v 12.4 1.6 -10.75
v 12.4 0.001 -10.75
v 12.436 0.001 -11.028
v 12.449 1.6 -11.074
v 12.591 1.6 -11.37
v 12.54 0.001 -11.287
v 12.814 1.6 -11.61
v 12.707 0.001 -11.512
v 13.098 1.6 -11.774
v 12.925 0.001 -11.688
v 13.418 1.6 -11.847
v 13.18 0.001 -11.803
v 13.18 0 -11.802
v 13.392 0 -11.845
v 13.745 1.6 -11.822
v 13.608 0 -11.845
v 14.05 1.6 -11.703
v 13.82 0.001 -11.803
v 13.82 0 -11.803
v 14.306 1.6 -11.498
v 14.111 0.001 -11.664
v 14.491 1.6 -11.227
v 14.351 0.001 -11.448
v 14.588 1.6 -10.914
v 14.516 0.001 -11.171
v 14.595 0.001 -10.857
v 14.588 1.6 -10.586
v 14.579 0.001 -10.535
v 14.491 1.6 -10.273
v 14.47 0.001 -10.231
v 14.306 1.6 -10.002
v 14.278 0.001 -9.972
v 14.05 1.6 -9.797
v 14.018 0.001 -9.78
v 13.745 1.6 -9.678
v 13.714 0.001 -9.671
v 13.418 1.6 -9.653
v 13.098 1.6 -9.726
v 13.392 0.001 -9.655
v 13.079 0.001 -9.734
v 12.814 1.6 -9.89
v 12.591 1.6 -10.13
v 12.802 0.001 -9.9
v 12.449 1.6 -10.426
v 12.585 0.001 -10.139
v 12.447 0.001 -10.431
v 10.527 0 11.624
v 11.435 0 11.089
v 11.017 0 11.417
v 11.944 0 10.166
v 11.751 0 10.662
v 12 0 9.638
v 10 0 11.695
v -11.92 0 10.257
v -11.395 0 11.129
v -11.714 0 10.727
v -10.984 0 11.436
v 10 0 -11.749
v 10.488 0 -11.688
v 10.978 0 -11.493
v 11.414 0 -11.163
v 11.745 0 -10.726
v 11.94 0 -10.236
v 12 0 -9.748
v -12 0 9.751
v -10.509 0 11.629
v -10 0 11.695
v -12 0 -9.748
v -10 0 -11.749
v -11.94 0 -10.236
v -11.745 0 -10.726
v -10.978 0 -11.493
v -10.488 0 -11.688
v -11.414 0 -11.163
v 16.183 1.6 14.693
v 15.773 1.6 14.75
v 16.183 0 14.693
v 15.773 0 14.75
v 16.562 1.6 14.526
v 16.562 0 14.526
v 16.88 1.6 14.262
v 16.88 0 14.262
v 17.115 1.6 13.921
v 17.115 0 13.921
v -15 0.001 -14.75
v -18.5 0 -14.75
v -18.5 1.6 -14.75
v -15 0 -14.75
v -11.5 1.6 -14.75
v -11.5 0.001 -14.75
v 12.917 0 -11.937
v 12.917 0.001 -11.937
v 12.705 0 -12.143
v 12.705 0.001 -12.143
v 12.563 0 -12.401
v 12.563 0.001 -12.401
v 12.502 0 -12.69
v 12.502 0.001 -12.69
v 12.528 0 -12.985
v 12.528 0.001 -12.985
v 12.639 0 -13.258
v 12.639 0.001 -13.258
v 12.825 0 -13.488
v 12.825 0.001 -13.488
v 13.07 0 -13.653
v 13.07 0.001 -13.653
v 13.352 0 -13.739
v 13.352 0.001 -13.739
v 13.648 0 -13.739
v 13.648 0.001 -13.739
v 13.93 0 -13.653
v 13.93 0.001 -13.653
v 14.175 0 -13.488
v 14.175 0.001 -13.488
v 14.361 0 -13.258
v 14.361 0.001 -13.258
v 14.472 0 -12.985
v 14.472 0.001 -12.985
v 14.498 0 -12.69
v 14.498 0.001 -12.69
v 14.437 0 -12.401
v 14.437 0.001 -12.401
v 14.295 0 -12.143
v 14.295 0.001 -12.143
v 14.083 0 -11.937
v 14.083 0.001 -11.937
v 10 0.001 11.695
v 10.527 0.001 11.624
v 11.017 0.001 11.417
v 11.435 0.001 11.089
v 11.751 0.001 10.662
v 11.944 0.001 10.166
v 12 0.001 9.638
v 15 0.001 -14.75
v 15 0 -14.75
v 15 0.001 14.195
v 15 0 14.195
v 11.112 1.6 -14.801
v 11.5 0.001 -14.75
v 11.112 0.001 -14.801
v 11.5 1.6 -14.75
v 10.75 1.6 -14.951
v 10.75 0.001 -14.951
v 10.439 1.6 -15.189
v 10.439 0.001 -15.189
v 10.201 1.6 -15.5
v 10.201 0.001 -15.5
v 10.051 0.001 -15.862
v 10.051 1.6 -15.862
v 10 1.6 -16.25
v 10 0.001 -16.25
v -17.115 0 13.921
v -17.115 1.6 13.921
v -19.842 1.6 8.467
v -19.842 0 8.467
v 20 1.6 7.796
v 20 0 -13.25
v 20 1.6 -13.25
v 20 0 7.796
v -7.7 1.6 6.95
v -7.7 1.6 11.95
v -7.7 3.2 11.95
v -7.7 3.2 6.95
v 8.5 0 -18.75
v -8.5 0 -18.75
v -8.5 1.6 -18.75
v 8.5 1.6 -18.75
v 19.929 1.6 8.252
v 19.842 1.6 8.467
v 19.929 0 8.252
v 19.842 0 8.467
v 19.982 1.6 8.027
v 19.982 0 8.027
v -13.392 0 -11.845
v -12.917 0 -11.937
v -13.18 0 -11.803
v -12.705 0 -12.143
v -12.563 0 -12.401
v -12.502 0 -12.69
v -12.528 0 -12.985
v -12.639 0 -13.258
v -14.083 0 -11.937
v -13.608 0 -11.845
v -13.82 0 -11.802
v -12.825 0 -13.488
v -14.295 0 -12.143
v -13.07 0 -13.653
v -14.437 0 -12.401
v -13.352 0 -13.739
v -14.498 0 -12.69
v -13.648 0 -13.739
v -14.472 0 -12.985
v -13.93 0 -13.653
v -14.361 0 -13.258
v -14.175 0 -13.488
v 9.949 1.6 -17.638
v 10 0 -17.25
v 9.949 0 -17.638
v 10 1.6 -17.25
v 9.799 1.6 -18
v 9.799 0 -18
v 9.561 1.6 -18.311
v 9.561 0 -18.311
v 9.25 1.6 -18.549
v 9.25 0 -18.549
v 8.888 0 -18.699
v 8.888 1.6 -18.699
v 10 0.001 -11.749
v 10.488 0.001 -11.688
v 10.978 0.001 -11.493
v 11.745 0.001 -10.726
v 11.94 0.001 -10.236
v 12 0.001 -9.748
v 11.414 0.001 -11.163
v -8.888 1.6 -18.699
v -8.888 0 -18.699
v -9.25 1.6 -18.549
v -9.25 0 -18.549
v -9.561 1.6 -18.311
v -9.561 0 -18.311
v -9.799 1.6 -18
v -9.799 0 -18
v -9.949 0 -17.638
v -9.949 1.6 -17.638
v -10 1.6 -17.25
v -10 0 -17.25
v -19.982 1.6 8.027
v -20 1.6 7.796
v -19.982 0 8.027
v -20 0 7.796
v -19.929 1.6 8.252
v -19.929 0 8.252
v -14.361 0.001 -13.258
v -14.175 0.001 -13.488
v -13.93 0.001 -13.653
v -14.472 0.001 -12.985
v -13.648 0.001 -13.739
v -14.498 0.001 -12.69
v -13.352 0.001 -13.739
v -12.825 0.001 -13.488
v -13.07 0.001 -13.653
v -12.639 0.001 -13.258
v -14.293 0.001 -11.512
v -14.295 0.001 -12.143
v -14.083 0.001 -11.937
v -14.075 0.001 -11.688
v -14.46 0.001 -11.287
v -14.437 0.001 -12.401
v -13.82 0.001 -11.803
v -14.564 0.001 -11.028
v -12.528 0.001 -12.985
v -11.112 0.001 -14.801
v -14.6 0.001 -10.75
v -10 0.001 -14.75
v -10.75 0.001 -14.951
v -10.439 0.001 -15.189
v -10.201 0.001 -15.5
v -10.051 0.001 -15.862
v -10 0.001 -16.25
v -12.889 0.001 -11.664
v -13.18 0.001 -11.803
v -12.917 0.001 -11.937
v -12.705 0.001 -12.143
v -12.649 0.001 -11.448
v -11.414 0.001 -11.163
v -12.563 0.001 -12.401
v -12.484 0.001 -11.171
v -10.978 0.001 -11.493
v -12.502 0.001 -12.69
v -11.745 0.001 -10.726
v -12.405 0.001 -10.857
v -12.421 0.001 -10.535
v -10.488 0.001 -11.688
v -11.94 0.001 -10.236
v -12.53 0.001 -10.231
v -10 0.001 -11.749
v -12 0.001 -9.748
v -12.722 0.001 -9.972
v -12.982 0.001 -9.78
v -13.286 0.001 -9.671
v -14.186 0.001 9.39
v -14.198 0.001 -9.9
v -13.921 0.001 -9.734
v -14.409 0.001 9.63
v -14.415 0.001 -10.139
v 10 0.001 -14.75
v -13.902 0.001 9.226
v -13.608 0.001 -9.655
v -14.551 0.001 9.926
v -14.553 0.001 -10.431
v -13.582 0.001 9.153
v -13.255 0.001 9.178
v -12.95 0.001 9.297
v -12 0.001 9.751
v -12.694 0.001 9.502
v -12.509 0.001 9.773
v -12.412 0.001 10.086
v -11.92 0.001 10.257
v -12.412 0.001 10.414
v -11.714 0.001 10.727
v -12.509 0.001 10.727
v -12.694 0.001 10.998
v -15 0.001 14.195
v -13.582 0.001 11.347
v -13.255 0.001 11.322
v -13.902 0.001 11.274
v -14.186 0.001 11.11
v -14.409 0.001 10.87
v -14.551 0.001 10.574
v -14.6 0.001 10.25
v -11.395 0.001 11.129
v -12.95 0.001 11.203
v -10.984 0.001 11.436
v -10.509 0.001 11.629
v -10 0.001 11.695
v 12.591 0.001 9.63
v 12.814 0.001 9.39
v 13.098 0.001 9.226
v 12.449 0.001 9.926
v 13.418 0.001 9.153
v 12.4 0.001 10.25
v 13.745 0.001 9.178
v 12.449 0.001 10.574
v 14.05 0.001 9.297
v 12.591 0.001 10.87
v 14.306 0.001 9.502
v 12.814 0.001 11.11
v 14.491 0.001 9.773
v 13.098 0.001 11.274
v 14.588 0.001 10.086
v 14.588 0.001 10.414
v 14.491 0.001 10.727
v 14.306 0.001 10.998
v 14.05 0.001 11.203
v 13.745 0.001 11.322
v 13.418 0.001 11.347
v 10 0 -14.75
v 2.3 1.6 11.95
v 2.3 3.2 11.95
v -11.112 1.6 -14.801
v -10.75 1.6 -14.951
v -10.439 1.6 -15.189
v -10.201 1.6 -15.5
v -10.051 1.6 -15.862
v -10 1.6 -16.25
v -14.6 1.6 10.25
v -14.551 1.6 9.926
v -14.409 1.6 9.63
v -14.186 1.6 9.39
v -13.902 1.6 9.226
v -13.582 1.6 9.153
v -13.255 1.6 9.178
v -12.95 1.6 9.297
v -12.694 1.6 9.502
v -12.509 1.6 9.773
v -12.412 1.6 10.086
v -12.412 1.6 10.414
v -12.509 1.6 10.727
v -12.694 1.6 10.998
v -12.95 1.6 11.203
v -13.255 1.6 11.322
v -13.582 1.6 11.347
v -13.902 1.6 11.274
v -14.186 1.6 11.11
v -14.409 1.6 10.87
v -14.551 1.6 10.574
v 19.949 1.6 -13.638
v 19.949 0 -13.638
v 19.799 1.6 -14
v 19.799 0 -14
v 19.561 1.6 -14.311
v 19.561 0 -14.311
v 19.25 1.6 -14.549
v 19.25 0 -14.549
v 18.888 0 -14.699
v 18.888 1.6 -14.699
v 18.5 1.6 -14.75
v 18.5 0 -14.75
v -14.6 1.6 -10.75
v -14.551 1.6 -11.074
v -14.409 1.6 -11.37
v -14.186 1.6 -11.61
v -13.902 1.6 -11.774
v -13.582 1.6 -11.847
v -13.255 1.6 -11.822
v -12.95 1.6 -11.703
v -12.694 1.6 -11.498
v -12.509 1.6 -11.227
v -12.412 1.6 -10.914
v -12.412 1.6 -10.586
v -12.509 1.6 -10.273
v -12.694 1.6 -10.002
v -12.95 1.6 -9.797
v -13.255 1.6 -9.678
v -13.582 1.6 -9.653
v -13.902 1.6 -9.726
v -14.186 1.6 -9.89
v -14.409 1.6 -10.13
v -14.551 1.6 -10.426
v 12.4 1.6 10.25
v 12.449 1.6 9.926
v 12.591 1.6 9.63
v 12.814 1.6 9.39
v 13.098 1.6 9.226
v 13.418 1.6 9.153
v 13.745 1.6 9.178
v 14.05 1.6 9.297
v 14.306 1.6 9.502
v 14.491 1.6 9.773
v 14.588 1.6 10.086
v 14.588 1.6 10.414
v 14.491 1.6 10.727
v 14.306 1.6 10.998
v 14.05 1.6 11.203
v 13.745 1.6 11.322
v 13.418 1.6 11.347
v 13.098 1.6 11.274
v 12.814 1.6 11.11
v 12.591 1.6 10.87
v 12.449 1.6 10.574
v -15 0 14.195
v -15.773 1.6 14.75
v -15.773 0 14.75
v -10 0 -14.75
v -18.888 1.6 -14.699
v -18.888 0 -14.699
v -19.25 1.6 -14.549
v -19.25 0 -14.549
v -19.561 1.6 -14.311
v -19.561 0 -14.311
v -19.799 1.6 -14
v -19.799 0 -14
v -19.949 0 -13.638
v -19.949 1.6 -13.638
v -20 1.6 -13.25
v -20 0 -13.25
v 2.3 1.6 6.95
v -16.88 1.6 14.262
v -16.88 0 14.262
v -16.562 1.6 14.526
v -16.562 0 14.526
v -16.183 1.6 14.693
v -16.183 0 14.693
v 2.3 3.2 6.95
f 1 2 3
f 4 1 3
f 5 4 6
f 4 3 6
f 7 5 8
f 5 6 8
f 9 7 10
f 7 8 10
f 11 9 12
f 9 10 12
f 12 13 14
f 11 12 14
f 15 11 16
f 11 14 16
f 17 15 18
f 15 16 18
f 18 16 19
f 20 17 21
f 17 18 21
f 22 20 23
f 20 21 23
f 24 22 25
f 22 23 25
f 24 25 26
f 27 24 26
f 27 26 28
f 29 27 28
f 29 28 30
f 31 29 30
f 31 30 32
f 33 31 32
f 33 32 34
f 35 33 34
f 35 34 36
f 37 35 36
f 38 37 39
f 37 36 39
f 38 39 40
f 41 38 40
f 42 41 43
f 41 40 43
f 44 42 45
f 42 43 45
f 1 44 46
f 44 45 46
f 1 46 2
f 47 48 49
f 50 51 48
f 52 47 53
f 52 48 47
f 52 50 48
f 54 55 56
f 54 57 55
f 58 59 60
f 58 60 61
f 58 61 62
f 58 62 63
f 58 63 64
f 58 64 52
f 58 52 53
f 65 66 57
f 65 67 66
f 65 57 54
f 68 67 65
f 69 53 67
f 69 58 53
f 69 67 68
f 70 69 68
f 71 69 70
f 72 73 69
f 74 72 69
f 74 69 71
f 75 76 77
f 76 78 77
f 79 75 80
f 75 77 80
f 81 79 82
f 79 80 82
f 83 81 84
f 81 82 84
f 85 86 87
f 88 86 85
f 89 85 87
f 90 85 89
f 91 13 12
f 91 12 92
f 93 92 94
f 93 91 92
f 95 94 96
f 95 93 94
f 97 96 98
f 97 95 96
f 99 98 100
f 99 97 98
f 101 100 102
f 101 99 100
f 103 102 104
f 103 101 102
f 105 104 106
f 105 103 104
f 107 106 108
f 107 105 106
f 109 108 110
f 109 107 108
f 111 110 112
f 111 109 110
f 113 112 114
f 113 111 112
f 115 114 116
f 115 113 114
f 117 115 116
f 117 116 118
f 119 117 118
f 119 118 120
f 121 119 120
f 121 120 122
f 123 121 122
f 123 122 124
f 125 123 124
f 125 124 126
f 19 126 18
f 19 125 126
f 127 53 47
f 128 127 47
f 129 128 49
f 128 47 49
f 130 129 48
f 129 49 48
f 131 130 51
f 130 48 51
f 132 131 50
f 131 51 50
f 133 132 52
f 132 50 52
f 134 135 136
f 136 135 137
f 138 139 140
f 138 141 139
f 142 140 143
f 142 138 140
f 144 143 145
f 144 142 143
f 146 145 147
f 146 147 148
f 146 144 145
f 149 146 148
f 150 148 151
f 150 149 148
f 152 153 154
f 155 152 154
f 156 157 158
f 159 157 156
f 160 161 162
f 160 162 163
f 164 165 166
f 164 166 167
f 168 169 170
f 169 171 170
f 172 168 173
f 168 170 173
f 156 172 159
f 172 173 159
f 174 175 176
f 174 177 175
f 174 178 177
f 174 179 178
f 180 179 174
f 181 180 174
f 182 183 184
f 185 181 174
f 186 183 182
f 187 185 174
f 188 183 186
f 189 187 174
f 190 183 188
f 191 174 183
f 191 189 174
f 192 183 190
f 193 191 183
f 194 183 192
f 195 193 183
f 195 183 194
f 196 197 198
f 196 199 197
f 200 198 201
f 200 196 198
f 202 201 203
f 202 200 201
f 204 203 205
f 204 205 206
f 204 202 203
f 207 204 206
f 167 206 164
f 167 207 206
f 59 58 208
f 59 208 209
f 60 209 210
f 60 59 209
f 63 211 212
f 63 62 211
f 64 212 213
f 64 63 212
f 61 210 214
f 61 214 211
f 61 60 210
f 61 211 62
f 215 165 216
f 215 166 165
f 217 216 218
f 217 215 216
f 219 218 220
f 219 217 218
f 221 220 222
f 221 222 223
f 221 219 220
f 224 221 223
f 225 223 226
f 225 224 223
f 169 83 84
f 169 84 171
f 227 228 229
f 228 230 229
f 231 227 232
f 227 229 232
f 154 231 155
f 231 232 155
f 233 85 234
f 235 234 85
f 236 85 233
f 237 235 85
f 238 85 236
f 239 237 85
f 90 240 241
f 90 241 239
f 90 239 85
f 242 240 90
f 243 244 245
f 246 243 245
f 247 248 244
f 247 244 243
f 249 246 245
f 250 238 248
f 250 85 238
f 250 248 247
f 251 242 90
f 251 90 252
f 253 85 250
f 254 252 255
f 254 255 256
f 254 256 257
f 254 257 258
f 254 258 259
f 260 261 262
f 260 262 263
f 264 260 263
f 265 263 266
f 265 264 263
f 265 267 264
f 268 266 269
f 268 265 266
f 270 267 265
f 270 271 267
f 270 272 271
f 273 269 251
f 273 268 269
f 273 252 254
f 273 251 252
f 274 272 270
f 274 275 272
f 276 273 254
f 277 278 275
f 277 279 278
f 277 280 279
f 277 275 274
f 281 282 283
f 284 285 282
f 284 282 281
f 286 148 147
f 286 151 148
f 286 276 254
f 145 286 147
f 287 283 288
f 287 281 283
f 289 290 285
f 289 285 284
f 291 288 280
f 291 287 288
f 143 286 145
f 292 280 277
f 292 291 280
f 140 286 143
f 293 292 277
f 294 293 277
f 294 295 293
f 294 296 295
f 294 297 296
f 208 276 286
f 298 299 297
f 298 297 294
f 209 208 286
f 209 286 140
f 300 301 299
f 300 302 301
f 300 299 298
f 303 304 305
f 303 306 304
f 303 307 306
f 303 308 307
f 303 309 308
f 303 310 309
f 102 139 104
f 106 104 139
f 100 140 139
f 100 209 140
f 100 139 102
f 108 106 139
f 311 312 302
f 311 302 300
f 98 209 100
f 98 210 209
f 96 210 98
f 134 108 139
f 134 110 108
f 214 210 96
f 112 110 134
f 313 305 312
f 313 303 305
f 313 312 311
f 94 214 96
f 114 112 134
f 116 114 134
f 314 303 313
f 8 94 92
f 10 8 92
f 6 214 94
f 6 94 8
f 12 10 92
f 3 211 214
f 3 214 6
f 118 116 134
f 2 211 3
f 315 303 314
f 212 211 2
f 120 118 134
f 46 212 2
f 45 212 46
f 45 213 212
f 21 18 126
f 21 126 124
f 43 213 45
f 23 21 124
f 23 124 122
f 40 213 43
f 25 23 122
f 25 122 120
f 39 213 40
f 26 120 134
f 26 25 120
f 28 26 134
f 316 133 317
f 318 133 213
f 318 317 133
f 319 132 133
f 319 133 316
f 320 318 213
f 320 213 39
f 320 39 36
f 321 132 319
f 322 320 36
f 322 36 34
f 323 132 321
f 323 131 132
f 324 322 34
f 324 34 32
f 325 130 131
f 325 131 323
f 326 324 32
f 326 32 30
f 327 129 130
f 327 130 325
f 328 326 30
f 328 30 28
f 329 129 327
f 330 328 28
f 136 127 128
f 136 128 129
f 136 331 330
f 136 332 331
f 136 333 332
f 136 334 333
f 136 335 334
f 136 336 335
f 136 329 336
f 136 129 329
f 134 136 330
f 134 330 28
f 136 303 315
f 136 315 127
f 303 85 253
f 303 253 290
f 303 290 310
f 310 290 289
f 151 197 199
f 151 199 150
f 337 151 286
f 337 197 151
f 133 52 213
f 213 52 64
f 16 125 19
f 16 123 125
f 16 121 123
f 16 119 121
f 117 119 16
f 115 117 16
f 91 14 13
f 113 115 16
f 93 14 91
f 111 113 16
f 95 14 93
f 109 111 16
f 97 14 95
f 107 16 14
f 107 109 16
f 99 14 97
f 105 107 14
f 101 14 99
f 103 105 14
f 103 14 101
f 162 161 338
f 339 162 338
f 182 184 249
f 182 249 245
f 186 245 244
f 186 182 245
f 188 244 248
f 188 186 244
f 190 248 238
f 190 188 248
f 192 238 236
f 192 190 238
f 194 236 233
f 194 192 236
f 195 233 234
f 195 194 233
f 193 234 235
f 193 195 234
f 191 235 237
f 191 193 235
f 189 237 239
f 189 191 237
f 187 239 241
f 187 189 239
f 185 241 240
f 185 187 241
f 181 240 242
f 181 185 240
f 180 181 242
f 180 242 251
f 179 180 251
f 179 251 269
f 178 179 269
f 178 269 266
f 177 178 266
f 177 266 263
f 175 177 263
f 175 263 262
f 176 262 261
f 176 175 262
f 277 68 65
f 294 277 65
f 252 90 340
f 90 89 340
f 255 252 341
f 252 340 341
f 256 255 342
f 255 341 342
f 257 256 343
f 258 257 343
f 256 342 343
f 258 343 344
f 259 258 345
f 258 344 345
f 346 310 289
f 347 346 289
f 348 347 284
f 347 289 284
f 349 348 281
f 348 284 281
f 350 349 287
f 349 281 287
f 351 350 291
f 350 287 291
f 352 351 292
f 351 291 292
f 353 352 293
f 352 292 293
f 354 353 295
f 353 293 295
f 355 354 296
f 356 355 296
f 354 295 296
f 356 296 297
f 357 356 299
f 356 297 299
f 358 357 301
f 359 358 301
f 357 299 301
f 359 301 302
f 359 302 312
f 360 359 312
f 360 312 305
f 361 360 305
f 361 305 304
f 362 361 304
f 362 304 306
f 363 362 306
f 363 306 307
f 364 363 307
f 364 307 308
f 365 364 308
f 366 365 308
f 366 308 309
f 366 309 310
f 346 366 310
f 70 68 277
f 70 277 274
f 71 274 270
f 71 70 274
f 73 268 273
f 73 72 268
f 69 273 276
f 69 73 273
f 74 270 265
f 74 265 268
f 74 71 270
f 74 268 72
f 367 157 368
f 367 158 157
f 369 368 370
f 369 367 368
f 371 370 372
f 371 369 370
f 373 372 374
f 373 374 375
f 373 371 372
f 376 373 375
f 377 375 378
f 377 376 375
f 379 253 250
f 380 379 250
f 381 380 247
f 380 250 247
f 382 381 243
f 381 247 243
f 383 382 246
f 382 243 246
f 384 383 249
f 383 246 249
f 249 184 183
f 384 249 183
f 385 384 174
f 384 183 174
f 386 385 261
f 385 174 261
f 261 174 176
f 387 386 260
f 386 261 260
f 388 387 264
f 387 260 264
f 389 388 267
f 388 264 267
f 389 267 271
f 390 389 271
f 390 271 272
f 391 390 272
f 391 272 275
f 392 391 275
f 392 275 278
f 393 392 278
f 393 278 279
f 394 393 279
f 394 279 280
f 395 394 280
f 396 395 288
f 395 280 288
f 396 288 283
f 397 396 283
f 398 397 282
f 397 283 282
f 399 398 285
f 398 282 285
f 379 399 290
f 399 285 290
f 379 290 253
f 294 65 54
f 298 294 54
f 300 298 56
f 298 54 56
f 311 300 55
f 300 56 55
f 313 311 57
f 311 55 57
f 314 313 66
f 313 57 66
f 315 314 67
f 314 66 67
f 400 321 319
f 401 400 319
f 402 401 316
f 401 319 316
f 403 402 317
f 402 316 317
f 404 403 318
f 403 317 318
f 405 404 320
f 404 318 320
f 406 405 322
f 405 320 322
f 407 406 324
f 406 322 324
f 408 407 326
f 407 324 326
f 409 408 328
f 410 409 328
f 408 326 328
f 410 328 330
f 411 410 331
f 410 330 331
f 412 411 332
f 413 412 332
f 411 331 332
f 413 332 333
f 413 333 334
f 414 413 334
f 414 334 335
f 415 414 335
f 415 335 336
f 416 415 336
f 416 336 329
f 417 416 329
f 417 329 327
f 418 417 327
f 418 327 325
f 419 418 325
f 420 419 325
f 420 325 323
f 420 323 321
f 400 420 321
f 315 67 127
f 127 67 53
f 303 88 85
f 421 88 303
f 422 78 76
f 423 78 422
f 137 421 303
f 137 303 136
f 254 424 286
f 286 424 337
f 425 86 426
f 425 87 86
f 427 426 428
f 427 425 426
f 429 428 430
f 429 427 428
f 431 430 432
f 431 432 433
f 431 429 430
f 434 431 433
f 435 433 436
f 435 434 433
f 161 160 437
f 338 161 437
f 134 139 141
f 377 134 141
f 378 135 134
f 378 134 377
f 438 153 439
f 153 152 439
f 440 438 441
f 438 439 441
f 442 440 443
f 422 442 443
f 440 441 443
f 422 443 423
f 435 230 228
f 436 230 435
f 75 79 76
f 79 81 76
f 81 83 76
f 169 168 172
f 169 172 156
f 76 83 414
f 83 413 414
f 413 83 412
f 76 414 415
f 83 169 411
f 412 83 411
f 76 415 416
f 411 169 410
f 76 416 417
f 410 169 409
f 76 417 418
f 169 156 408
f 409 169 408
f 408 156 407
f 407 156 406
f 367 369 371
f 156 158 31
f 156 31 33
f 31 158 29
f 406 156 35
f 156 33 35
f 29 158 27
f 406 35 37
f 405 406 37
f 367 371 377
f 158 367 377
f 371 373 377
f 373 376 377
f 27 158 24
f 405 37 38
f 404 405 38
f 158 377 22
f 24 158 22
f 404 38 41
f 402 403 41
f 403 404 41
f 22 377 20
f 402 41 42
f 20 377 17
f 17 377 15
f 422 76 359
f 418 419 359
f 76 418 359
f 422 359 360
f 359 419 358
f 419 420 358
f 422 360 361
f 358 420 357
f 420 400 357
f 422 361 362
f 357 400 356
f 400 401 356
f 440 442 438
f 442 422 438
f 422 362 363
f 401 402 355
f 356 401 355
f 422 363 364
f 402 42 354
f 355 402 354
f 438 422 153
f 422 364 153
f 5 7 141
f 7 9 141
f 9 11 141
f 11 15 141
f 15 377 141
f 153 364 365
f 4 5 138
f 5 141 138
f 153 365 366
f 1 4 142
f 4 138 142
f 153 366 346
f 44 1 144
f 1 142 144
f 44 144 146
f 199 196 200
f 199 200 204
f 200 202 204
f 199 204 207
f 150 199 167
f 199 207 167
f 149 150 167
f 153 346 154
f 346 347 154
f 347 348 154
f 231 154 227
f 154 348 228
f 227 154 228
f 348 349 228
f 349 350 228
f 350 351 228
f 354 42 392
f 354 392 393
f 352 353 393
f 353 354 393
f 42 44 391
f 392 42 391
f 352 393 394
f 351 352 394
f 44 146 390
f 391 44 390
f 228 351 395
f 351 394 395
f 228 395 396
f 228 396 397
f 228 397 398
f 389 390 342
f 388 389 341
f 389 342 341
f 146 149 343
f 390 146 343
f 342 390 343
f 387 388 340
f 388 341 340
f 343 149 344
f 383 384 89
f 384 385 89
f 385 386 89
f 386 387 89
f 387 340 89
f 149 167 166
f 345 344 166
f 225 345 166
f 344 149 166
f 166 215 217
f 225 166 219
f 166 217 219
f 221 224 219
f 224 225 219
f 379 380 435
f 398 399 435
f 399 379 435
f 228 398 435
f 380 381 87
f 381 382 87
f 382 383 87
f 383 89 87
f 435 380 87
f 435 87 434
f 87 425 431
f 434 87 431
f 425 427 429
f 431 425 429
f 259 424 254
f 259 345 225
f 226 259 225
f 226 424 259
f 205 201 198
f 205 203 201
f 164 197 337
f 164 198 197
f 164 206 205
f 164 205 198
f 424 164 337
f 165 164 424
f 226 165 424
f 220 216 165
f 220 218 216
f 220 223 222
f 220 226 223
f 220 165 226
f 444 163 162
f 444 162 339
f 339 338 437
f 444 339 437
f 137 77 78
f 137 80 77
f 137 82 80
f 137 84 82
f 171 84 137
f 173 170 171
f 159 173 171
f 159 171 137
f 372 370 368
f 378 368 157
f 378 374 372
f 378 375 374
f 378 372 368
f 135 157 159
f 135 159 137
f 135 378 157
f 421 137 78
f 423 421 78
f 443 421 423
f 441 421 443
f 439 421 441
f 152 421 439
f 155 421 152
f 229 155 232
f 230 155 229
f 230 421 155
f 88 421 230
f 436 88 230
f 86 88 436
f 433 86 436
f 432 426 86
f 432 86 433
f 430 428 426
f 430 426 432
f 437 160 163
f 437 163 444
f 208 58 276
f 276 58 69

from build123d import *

# Parameters (mm, degrees)
BOSS_EXTRUDE1_DEPTH      = 1.6
CUT_EXTRUDE4_DEPTH       = 28.461290938
M2_CLEARANCE_HOLE1_D     = 2.2
M2_CLEARANCE_HOLE1_DEPTH = 5.2
M2_CLEARANCE_HOLE1_TIP   = 0.660946681
SKETCH11_W               = 30
SKETCH11_H               = 28.944863729
SKETCH11_R               = 1
CUT_EXTRUDE3_DEPTH       = 0.001
SKETCH13_W               = 10
SKETCH13_H               = 5
BOSS_EXTRUDE2_DEPTH      = 1.6
FILLET1_R                = 1.5


with BuildPart() as part:
    # Sketch1 → Boss-Extrude1 (new body)
    with BuildSketch(Plane(origin=(0, 0, 0), x_dir=(1, 0, 0), z_dir=(0, 1, 0))):
        Polygon((-20, 14.75), (-10, 14.75), (-10, 18.75), (10, 18.75), (10, 14.75), (20, 14.75), (20, -14.75), (-20, -14.75), align=None)
    extrude(amount=BOSS_EXTRUDE1_DEPTH)

    # Sketch12 → Cut-Extrude4 (cut, through all)
    with BuildSketch(Plane(origin=(0, 1.6, 0), x_dir=(1, 0, 0), z_dir=(0, 1, 0))):
        Polygon((-16.7, -14.75), (-20, -8.15), (-20, -14.75), align=None)
        Polygon((16.7, -14.75), (20, -8.15), (20, -14.75), align=None)
    extrude(amount=-CUT_EXTRUDE4_DEPTH, mode=Mode.SUBTRACT)

    # M2 Clearance Hole1
    with Locations(Plane(origin=(0, 1.6, 0), x_dir=(1, 0, 0), z_dir=(0, 1, 0))):
        with Locations((-13.5, 10.75), (13.5, 10.75), (13.5, -10.25), (-13.5, -10.25)):
            Hole(M2_CLEARANCE_HOLE1_D / 2, depth=M2_CLEARANCE_HOLE1_DEPTH)
            with Locations((0, 0, -(M2_CLEARANCE_HOLE1_DEPTH + M2_CLEARANCE_HOLE1_TIP / 2))):  # 118° drill point
                Cone(0, M2_CLEARANCE_HOLE1_D / 2, M2_CLEARANCE_HOLE1_TIP, mode=Mode.SUBTRACT)

    # Sketch11 → Cut-Extrude3 (cut)
    with BuildSketch(Plane.XZ):
        with Locations((0, -0.277568136)):
            Rectangle(SKETCH11_W, SKETCH11_H)
        with Locations((13.5, -12.75)):
            Circle(SKETCH11_R, mode=Mode.SUBTRACT)
        with Locations((13.5, 10.25)):
            Circle(SKETCH11_R, mode=Mode.SUBTRACT)
        with Locations((-13.5, -12.75)):
            Circle(SKETCH11_R, mode=Mode.SUBTRACT)
        with Locations((-13.5, 10.25)):
            Circle(SKETCH11_R, mode=Mode.SUBTRACT)
        with BuildLine():
            Line((-10, 11.694863729), (10, 11.694863729))
            ThreePointArc((10, 11.694863729), (11.434632325, 11.088706998), (12, 9.637516011))
            Line((12, 9.637516011), (12, -9.74800182))
            add(Edge.make_bspline(
                [(10, -11.748801092), (12, -11.748801092), (12, -9.74800182)],
                knots=[3.141592654, 3.141592654, 3.141592654, 4.71238898, 4.71238898, 4.71238898], degree=2, weights=[1, 0.707106781, 1]))
            Line((10, -11.748801092), (-10, -11.748801092))
            add(Edge.make_bspline(
                [(-12, -9.74800182), (-12, -11.748801092), (-10, -11.748801092)],
                knots=[1.570796327, 1.570796327, 1.570796327, 3.141592654, 3.141592654, 3.141592654], degree=2, weights=[1, 0.707106781, 1]))
            Line((-12, -9.74800182), (-12, 9.750612903))
            ThreePointArc((-12, 9.750612903), (-11.394642541, 11.128696782), (-10, 11.694863729))
        make_face(mode=Mode.SUBTRACT)
    extrude(amount=-CUT_EXTRUDE3_DEPTH, mode=Mode.SUBTRACT)

    # Fillet1
    fillet1_edges = [part.edges().sort_by_distance(p)[0] for p in [
        (-20, 0.8, -14.75),
        (-10, 0.8005, -14.75),
        (-10, 0.8, -18.75),
        (10, 0.8, -18.75),
        (10, 0.8005, -14.75),
        (20, 0.8, -14.75),
        (-16.7, 0.8, 14.75),
        (-20, 0.8, 8.15),
        (16.7, 0.8, 14.75),
        (20, 0.8, 8.15),
    ]]
    fillet(fillet1_edges, radius=FILLET1_R)


with BuildPart() as body_2:
    # Sketch13 → Boss-Extrude2 (new body)
    with BuildSketch(Plane(origin=(0, 1.6, 0), x_dir=(1, 0, 0), z_dir=(0, 1, 0))):
        with Locations((-2.7, -9.45)):
            Rectangle(SKETCH13_W, SKETCH13_H)
    extrude(amount=BOSS_EXTRUDE2_DEPTH)


solid = Compound([part.part, body_2.part])
